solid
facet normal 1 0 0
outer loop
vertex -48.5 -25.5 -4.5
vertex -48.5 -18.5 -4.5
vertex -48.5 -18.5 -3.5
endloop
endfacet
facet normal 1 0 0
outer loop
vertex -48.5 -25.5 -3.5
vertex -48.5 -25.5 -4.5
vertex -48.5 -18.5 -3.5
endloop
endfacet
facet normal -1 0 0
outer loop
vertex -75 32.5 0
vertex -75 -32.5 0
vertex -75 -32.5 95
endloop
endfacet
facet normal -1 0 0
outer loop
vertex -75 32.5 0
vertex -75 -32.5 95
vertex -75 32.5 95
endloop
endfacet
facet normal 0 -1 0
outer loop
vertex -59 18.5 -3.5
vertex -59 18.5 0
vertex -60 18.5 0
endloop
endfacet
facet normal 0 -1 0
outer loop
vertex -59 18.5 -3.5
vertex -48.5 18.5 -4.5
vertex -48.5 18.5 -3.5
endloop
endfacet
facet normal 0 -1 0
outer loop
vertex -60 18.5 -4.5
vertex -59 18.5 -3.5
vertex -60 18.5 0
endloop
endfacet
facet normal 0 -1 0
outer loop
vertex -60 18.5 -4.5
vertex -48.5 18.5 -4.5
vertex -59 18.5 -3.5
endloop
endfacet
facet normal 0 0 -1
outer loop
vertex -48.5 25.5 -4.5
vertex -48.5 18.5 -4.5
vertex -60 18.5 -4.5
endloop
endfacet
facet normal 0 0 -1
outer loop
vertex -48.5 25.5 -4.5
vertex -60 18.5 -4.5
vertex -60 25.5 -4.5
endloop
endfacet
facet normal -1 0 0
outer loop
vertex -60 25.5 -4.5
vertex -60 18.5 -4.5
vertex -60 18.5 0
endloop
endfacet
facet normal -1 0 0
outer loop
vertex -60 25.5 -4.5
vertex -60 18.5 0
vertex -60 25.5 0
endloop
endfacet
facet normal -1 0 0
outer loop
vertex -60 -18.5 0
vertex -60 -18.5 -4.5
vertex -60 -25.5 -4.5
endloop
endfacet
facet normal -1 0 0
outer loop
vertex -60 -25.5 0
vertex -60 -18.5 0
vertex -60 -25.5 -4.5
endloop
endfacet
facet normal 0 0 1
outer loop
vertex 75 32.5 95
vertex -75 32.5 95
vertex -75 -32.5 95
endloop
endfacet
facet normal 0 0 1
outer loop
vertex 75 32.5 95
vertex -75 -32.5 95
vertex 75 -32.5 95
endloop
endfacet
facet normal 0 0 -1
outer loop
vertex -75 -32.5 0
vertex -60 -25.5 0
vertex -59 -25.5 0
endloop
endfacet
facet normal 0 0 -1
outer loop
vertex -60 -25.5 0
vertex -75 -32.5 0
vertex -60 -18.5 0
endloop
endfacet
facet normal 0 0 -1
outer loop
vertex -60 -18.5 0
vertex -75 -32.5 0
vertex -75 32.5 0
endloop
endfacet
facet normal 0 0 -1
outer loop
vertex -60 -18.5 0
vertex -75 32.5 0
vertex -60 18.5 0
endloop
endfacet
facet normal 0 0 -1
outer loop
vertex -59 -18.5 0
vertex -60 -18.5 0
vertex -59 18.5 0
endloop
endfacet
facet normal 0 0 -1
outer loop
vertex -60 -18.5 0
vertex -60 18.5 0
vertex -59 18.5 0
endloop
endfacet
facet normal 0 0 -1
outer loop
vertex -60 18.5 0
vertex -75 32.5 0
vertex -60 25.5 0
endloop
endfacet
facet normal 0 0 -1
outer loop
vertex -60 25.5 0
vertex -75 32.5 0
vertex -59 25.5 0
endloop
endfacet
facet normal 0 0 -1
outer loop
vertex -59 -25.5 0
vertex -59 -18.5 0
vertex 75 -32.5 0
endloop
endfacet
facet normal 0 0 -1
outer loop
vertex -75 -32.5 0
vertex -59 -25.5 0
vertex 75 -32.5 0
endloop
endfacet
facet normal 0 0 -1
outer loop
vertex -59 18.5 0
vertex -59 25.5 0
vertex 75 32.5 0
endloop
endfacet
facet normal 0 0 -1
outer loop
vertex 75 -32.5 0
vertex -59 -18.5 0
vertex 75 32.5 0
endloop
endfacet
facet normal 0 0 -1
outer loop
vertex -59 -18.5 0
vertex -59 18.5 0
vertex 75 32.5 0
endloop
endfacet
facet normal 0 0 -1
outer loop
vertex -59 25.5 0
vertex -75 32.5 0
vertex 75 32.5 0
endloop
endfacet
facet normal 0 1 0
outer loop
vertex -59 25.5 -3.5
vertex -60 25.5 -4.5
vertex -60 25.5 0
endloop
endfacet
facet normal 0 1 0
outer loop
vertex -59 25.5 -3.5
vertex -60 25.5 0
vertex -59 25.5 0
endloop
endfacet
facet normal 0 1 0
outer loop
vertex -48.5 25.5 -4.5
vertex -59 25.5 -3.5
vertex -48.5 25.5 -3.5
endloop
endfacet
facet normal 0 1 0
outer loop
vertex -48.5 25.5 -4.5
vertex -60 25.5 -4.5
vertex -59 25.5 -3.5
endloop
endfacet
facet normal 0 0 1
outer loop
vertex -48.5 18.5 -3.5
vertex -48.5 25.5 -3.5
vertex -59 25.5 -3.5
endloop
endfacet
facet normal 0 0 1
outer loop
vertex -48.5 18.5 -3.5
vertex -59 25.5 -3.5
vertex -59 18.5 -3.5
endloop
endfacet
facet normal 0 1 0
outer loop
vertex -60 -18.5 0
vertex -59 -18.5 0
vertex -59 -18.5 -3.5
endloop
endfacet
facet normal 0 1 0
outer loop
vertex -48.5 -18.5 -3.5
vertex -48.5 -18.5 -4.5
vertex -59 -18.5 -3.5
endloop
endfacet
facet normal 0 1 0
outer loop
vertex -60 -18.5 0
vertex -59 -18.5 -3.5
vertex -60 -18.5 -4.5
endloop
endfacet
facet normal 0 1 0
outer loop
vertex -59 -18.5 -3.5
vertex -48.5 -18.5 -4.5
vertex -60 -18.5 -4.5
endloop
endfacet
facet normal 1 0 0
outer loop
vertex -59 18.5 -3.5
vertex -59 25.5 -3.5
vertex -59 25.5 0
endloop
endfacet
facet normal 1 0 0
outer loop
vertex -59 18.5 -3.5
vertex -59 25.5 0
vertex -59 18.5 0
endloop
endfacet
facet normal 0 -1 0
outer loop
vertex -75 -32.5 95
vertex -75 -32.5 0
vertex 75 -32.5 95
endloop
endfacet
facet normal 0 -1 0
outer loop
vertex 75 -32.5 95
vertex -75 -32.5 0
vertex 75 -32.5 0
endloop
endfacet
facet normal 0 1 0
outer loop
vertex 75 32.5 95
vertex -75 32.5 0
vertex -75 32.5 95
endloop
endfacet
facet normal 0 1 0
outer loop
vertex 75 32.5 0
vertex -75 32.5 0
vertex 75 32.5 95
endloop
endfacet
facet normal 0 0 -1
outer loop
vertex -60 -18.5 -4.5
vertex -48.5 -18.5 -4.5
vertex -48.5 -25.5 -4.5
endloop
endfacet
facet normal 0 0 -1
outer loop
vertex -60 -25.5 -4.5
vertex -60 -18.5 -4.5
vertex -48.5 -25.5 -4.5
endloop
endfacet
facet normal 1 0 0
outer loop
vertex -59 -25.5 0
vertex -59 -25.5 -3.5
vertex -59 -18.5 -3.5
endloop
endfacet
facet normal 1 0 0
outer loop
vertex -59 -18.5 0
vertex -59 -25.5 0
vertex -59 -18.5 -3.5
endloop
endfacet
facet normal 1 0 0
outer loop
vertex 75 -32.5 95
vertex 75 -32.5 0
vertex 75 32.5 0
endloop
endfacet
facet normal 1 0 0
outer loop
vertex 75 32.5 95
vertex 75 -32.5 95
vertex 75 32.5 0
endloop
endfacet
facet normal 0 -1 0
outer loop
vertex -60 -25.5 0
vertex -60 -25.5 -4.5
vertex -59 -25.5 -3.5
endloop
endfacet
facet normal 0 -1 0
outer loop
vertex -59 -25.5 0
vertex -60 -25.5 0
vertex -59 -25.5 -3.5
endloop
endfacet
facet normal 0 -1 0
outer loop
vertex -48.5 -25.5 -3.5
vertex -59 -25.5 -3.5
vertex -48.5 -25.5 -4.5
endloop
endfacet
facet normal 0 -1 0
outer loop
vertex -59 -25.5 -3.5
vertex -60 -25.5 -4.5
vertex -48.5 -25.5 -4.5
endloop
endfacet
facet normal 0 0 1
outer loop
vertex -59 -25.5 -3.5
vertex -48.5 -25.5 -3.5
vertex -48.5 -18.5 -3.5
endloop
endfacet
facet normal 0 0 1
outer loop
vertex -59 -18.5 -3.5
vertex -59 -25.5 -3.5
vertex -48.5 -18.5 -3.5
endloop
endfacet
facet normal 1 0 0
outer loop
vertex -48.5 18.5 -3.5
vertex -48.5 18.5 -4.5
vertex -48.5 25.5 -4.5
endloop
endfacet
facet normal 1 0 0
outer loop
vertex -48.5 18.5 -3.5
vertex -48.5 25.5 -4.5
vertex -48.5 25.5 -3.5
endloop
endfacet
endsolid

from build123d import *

# Parameters (mm, degrees)
SKETCH_1_W      = 150
SKETCH_1_H      = 65
EXTRUDE_1_DEPTH = 95
SKETCH_2_W      = 1
SKETCH_2_H      = 7


with BuildPart() as part:
    # 草图1 → 拉伸1 (new body)
    with BuildSketch(Plane.XY):
        Rectangle(SKETCH_1_W, SKETCH_1_H)
    extrude(amount=EXTRUDE_1_DEPTH)

    # 扫描1: sweep along a path in 草图3
    with BuildLine(Plane(origin=(0, 19, 0), x_dir=(-1, 0, 0), z_dir=(0, 1, 0))) as sweep_1_path:
        Line((59.5, 0), (59.5, -4))
        Line((59.5, -4), (48.5, -4))
    # 草图2 → 扫描1 (sweep)
    with BuildSketch(Plane(origin=(0, 0, 0), x_dir=(-1, 0, 0), z_dir=(0, 0, -1))):
        with Locations((59.5, 22)):
            Rectangle(SKETCH_2_W, SKETCH_2_H)
    sweep_1 = sweep(path=sweep_1_path.line, transition=Transition.RIGHT)

    # 镜向1: 扫描1 across plane
    add(sweep_1.mirror(Plane.ZX))


solid = part.part
